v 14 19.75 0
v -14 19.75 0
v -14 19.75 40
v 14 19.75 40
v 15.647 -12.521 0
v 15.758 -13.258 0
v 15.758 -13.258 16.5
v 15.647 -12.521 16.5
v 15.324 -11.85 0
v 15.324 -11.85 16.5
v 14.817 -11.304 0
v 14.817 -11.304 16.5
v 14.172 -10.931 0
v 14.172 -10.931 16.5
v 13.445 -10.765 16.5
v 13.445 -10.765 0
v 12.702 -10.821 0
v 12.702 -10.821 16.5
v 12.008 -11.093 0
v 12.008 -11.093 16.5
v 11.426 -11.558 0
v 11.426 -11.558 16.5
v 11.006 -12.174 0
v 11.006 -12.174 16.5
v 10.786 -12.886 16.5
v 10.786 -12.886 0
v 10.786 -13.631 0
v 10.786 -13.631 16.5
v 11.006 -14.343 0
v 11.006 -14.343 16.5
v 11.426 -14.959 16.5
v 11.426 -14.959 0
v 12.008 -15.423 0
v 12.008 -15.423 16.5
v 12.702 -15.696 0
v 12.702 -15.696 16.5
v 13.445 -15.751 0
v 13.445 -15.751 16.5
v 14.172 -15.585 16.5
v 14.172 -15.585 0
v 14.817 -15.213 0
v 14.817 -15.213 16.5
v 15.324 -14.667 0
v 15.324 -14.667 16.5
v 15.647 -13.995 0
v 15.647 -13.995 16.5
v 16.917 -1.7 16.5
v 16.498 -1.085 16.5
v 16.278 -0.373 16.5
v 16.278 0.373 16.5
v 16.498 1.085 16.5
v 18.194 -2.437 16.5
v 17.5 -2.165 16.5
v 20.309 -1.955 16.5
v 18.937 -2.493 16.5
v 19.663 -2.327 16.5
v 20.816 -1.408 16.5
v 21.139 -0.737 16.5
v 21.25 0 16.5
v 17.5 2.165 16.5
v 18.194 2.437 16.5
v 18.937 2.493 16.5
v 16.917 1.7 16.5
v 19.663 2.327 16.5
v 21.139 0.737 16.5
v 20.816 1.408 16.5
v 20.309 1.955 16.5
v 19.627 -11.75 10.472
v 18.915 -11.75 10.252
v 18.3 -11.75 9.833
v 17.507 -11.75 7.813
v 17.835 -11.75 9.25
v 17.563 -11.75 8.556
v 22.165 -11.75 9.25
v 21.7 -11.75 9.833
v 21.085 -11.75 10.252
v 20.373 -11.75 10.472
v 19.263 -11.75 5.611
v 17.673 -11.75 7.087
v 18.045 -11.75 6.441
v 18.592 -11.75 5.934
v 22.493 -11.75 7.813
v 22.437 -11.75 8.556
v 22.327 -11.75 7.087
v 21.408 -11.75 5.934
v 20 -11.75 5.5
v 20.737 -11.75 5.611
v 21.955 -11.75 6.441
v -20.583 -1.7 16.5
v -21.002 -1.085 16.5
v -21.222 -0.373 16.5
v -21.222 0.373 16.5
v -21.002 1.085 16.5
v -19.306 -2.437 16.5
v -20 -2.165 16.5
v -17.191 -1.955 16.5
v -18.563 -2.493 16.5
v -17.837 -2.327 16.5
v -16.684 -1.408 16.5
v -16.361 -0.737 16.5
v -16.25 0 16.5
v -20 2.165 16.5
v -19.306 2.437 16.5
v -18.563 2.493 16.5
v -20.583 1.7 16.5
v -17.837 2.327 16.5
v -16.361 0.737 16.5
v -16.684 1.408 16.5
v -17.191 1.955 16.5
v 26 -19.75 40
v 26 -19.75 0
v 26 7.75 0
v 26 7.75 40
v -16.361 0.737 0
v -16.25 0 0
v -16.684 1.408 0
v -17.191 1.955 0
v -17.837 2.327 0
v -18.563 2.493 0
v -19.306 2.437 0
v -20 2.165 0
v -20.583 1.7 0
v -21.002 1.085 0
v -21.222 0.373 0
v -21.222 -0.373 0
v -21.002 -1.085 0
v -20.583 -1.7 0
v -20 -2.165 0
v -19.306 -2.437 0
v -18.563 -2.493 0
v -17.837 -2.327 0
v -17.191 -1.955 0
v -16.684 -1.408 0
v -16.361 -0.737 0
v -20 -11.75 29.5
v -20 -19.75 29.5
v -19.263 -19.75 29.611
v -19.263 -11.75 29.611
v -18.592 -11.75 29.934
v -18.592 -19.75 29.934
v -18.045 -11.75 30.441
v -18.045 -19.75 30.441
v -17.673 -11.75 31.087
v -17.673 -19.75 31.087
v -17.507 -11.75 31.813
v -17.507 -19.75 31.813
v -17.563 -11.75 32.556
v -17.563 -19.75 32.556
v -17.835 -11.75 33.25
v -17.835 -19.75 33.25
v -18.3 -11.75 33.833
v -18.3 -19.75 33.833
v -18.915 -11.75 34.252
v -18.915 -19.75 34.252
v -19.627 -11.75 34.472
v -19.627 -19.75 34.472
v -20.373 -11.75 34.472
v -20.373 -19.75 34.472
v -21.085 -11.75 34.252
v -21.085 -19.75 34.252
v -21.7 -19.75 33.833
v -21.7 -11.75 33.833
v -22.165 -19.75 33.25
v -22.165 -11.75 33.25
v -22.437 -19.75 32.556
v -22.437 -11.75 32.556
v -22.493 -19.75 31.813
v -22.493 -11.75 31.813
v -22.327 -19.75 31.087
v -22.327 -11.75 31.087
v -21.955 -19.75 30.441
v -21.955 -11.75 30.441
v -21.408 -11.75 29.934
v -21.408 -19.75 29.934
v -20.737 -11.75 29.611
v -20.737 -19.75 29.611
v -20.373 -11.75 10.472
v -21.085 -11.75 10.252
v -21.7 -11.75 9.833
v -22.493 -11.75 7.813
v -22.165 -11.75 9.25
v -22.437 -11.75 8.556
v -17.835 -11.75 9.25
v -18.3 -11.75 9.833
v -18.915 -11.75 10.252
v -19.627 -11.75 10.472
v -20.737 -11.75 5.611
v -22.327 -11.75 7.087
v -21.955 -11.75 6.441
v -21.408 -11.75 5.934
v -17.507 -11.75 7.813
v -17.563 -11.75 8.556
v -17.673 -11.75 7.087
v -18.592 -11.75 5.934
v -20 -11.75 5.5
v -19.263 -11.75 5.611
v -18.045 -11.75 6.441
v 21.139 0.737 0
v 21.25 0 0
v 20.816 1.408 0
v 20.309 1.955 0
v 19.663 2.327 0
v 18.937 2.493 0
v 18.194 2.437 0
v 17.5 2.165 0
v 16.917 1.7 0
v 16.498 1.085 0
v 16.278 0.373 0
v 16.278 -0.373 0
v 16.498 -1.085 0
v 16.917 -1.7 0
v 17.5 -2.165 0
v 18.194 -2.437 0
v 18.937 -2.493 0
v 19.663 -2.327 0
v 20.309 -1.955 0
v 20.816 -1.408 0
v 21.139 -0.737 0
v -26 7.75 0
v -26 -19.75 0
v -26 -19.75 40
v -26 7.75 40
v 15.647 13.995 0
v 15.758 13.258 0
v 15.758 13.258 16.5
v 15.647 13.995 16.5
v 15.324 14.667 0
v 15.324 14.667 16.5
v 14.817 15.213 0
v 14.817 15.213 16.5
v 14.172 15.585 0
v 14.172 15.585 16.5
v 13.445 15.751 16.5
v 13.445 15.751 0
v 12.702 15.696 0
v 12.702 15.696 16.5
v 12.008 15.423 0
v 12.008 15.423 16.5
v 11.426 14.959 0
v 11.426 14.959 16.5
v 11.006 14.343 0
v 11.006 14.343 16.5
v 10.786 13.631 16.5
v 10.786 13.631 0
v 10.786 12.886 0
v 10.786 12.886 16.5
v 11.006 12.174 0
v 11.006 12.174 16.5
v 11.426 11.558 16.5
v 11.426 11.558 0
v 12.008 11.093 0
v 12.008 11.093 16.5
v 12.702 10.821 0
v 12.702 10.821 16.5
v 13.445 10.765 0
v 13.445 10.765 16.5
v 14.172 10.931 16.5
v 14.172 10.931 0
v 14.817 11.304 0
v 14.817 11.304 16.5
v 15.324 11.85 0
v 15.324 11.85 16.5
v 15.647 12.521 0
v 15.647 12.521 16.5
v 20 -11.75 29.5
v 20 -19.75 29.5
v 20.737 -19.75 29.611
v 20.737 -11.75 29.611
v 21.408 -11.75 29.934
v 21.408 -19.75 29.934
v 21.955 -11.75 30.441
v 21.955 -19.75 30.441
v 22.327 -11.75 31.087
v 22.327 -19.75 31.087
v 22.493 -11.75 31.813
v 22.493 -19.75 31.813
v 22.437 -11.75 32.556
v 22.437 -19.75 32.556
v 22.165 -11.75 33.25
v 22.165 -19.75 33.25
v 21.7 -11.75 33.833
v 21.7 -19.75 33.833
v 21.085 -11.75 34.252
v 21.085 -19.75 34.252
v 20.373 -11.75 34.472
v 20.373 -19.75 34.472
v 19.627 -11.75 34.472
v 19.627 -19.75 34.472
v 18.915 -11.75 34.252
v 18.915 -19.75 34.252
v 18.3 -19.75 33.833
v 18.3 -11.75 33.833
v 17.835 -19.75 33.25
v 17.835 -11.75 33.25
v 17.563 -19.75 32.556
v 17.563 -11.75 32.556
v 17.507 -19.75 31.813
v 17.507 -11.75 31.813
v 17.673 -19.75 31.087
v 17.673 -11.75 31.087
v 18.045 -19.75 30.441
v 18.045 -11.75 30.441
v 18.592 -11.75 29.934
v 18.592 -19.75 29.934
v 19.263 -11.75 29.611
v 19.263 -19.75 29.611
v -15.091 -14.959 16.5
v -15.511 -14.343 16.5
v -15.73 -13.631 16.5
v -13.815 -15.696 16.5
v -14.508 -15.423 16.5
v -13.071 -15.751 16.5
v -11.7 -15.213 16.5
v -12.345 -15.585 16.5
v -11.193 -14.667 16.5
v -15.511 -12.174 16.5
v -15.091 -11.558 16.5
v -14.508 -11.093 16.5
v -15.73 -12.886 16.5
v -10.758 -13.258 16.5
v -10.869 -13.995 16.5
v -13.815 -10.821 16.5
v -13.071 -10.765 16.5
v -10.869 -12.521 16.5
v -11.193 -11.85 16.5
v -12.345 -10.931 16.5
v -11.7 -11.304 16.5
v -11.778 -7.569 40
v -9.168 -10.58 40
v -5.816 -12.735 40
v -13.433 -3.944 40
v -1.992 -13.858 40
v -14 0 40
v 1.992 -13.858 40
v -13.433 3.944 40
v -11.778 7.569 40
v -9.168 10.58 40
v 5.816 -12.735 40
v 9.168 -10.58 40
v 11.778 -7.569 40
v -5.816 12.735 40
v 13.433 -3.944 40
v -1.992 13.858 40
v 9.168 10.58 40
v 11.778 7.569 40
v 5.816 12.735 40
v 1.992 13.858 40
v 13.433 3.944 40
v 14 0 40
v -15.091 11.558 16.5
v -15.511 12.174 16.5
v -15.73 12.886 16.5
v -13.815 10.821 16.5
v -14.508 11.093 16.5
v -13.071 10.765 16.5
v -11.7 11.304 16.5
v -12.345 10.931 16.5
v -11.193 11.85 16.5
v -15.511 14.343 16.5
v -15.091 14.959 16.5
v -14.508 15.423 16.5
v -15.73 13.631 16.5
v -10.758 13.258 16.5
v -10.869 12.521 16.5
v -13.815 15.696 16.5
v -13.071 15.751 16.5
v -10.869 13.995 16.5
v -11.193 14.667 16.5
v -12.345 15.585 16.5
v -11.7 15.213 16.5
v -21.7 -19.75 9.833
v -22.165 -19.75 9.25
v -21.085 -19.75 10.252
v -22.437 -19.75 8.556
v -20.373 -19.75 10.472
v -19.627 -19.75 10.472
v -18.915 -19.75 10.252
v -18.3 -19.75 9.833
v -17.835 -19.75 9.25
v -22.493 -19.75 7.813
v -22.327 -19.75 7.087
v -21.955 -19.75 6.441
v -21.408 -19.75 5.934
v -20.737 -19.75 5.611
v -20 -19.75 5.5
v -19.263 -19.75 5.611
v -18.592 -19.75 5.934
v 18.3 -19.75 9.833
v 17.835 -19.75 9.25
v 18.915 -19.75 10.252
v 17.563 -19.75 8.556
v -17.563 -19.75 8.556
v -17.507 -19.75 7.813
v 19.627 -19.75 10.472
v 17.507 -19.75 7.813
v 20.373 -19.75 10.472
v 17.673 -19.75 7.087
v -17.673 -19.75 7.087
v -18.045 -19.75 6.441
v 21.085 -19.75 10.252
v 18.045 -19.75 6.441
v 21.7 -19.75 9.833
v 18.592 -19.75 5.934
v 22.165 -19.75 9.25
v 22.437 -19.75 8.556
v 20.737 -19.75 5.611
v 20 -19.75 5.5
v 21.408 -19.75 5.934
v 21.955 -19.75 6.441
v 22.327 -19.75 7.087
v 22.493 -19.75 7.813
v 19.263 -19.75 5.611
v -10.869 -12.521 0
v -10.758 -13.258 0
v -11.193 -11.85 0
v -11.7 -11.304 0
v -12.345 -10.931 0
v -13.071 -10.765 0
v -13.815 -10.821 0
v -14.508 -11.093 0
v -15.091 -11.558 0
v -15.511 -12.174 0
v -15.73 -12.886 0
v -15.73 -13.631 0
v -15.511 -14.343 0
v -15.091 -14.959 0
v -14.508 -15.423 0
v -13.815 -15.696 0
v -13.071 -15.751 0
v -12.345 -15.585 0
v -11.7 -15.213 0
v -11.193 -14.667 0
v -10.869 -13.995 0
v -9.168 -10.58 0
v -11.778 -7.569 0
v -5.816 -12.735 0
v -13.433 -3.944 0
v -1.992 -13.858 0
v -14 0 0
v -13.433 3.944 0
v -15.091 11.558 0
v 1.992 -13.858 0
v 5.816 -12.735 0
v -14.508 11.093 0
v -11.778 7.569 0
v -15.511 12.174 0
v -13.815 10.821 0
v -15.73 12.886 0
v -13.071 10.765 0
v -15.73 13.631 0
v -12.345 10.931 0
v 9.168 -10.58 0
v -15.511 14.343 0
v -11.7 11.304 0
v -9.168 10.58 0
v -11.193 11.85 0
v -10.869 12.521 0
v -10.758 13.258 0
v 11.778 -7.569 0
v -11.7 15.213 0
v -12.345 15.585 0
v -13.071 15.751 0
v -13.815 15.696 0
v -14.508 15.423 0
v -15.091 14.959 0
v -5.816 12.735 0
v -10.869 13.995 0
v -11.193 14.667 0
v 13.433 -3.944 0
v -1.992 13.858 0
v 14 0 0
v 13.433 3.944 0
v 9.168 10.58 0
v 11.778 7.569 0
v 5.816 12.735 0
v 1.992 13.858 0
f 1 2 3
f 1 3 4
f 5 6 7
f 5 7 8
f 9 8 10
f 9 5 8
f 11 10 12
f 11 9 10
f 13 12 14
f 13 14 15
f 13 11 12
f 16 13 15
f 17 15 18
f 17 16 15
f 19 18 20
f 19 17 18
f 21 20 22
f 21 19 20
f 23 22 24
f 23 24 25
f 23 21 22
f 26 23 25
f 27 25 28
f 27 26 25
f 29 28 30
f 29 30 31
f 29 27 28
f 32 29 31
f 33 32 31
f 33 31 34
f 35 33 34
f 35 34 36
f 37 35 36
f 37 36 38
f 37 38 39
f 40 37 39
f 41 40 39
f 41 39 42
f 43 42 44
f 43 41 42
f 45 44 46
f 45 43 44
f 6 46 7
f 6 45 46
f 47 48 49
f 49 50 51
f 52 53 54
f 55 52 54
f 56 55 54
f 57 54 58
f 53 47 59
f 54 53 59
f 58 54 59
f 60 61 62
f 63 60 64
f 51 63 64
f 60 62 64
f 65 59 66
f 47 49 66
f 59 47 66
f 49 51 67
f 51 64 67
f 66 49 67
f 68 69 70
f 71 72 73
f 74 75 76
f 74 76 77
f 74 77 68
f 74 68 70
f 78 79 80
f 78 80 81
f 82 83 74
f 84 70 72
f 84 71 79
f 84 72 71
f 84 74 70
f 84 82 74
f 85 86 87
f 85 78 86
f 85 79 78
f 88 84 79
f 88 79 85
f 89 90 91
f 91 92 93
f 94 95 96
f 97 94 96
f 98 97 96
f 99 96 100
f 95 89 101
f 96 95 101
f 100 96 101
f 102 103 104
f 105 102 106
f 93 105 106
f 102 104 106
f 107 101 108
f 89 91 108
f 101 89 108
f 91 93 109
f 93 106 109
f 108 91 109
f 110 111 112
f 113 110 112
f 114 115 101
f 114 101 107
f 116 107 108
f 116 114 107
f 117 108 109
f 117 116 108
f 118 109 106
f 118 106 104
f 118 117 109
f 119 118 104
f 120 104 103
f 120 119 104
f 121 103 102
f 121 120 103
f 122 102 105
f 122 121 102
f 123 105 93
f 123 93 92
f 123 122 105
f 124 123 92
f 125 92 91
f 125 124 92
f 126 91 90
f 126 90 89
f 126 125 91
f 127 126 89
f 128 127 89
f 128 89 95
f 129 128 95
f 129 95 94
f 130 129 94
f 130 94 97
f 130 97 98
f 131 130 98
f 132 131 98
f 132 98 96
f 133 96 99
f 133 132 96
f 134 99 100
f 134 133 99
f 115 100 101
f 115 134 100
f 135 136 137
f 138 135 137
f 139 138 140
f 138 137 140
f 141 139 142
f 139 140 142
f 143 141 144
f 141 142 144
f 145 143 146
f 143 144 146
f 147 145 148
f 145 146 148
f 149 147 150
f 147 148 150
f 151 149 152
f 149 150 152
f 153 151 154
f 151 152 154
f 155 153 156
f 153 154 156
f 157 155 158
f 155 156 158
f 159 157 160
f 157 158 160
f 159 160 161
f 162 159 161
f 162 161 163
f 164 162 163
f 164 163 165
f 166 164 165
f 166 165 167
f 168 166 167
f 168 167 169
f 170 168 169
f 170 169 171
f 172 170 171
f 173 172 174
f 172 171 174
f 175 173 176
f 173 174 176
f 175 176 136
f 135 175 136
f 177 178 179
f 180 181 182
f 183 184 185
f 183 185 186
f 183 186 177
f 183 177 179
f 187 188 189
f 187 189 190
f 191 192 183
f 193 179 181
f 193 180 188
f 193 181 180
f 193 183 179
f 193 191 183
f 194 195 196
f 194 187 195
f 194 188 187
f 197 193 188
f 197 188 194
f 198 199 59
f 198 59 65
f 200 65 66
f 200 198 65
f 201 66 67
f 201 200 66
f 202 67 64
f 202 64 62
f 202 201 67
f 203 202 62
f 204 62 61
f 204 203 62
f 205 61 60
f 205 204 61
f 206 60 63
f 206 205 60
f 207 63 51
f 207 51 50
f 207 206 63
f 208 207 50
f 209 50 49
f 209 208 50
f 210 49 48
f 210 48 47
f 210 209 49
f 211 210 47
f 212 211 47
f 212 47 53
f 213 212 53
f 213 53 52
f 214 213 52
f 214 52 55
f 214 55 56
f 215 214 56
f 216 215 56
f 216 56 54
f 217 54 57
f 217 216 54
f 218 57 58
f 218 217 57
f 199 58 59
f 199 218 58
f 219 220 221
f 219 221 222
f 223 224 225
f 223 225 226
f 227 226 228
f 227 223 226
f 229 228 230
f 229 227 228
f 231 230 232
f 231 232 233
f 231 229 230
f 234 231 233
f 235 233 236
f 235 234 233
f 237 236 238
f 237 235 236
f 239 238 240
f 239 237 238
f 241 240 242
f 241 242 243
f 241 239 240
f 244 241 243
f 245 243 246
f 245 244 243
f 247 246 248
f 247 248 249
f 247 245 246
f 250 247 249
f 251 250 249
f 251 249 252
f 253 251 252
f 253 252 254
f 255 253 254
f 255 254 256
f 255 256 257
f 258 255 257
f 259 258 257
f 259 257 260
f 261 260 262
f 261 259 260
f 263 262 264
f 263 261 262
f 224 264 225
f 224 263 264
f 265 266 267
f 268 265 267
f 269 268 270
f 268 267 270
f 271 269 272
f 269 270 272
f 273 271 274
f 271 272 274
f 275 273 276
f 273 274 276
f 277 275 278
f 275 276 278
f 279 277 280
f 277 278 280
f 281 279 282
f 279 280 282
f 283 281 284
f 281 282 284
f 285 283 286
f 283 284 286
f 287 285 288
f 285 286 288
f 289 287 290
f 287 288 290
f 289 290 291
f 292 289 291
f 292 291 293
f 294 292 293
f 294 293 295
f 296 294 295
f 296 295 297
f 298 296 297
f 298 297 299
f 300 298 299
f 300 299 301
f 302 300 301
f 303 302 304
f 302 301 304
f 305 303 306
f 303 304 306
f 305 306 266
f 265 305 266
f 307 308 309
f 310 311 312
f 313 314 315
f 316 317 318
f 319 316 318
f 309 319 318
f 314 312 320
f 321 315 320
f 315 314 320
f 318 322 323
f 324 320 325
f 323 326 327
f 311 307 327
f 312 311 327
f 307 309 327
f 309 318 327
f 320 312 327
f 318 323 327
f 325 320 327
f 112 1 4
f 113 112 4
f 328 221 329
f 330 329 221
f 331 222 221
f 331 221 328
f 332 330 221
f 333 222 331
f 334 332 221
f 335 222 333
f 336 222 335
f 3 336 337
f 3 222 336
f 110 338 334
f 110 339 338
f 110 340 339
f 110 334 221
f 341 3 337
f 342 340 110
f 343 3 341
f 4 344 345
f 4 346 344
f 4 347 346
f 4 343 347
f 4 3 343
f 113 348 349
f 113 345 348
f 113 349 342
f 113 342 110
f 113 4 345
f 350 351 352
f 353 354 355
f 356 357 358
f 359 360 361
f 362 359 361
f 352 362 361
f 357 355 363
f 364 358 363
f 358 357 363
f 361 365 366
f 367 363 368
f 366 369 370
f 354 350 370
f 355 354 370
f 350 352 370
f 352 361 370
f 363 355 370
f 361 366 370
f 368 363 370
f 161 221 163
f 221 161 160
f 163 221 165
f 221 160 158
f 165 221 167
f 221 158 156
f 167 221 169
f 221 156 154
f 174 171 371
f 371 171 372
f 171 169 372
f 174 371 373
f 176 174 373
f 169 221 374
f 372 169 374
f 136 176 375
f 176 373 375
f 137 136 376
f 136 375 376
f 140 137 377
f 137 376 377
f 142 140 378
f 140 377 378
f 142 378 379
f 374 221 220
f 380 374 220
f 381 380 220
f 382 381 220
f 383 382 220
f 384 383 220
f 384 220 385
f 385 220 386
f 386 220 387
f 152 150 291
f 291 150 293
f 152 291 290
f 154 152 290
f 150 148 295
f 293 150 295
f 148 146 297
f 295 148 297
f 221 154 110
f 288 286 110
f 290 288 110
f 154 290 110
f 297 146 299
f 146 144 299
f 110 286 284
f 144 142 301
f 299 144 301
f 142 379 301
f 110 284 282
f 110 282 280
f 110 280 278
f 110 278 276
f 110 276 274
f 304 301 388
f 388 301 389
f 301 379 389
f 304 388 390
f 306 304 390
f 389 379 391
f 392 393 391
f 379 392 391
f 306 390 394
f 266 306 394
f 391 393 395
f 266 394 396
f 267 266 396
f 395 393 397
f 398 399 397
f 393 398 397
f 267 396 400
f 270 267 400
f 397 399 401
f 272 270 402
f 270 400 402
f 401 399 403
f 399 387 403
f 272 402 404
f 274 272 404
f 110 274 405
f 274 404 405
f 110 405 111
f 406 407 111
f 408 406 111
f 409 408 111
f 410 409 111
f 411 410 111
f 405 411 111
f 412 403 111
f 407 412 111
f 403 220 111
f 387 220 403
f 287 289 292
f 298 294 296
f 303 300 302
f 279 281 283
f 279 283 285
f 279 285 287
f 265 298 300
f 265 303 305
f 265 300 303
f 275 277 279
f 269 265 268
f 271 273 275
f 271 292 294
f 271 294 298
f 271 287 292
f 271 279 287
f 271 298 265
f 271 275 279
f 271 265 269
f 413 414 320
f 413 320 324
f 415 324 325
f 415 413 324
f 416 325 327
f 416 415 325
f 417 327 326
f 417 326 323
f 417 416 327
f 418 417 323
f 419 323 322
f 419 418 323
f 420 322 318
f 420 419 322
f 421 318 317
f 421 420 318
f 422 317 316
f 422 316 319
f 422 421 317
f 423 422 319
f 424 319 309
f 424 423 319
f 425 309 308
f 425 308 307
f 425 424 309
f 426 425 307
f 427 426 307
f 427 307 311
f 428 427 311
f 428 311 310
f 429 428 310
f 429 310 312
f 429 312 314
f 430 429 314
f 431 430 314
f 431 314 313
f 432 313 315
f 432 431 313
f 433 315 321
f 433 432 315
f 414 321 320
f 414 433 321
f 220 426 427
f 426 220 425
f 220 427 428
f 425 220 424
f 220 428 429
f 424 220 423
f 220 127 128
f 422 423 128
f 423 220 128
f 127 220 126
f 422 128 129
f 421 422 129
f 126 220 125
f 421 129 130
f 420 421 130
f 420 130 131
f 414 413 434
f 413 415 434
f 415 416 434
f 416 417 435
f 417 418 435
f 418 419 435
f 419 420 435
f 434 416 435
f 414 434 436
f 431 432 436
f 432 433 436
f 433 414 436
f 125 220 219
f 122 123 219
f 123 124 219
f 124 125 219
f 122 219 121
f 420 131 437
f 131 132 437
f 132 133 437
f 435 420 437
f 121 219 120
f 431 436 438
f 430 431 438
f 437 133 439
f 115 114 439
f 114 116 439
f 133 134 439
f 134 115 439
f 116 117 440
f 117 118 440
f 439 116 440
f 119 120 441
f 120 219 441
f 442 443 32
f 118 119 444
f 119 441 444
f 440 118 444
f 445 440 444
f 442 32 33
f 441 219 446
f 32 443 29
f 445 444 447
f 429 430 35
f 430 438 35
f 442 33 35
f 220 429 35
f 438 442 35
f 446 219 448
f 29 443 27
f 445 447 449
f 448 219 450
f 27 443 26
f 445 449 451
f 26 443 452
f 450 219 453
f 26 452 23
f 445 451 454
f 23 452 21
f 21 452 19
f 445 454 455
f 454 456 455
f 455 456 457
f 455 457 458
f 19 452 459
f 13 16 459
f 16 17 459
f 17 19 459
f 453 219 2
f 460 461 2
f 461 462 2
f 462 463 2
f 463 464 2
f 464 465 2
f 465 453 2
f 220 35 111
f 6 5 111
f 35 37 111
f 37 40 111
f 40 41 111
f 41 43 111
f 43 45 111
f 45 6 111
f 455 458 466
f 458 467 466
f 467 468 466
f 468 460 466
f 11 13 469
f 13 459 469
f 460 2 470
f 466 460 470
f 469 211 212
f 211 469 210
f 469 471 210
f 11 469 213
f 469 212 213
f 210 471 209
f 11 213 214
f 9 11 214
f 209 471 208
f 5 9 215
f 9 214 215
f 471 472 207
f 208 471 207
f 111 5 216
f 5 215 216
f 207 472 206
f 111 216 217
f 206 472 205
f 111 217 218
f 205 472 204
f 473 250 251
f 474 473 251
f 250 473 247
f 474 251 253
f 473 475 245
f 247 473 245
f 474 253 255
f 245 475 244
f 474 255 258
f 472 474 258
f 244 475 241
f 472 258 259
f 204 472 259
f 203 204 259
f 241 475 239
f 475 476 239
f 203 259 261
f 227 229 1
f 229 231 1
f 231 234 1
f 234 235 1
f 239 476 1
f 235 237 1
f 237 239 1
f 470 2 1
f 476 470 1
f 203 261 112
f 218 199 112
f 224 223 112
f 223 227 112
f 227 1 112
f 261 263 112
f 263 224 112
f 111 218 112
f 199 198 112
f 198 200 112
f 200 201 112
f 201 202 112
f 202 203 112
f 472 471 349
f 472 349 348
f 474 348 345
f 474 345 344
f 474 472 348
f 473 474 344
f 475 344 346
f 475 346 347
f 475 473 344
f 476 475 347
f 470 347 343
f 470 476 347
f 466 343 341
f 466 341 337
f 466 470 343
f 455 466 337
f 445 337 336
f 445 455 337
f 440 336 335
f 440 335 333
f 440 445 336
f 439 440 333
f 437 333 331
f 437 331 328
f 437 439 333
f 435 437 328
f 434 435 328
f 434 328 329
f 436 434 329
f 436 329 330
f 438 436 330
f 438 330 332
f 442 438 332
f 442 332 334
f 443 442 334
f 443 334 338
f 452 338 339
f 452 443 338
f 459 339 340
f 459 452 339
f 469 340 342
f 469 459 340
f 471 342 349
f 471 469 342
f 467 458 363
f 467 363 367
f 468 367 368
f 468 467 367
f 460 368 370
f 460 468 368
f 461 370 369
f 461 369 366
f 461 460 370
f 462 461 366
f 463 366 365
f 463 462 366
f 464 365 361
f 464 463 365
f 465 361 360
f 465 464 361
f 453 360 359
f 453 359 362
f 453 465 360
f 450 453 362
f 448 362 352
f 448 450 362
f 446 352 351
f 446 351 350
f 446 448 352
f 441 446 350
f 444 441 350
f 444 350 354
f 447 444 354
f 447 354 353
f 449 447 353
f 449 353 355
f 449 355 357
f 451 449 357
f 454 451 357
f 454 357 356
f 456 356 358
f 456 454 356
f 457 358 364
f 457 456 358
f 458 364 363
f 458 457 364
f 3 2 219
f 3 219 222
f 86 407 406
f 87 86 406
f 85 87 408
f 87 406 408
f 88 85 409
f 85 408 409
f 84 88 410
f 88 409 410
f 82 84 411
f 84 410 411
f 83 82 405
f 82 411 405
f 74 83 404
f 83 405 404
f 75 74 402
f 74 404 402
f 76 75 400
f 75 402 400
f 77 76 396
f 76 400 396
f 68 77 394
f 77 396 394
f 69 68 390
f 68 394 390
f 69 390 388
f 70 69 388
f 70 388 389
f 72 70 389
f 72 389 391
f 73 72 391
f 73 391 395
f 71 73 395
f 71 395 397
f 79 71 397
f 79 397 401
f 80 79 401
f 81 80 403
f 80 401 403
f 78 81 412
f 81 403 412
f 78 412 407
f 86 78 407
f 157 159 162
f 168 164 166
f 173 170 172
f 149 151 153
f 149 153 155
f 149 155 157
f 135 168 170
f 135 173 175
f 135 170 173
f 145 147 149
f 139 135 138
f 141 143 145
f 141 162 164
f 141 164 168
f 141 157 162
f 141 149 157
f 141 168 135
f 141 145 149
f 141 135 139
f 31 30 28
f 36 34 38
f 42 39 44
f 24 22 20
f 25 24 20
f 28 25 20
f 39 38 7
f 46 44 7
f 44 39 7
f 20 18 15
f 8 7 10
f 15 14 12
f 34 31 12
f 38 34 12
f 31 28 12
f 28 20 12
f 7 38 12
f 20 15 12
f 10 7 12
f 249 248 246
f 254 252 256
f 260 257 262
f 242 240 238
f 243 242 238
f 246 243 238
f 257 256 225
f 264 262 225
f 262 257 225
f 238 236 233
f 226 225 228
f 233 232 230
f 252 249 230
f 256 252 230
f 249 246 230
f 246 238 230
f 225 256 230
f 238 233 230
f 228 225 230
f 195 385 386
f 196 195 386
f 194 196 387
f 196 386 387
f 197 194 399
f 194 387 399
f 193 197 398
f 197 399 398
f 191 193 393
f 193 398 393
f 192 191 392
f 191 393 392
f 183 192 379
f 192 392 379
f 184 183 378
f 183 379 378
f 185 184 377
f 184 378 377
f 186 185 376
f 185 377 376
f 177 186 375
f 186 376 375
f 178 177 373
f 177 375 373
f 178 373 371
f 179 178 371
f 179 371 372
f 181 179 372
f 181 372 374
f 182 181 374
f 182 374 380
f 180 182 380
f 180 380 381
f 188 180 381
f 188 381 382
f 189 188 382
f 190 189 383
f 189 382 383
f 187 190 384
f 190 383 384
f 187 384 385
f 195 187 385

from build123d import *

# Parameters (mm, degrees)
SKETCH1_W           = 52
SKETCH1_H           = 39.5
SKETCH1_R           = 2.5
SKETCH1_R_2         = 14
BOSS_EXTRUDE1_DEPTH = 40
CHAMFER1_SIZE       = 12
SKETCH1_3_R         = 2.5
CUT_EXTRUDE1_DEPTH  = 16.5
SKETCH2_R           = 2.5
CUT_EXTRUDE2_DEPTH  = 8


with BuildPart() as part:
    # Sketch1 → Boss-Extrude1 (new body)
    with BuildSketch(Plane.XY):
        Rectangle(SKETCH1_W, SKETCH1_H)
        with Locations((13.258252147, 13.258252147)):
            Circle(SKETCH1_R, mode=Mode.SUBTRACT)
        with Locations((-13.258252147, 13.258252147)):
            Circle(SKETCH1_R, mode=Mode.SUBTRACT)
        with Locations((-18.75, 0)):
            Circle(SKETCH1_R, mode=Mode.SUBTRACT)
        with Locations((-13.258252147, -13.258252147)):
            Circle(SKETCH1_R, mode=Mode.SUBTRACT)
        with Locations((13.258252147, -13.258252147)):
            Circle(SKETCH1_R, mode=Mode.SUBTRACT)
        with Locations((18.75, 0)):
            Circle(SKETCH1_R, mode=Mode.SUBTRACT)
        Circle(SKETCH1_R_2, mode=Mode.SUBTRACT)
        with Locations((13.258252147, -13.258252147)):
            Circle(SKETCH1_R)
        with Locations((-13.258252147, -13.258252147)):
            Circle(SKETCH1_R)
        with Locations((-18.75, 0)):
            Circle(SKETCH1_R)
        with Locations((18.75, 0)):
            Circle(SKETCH1_R)
        with Locations((-13.258252147, 13.258252147)):
            Circle(SKETCH1_R)
        with Locations((13.258252147, 13.258252147)):
            Circle(SKETCH1_R)
    extrude(amount=BOSS_EXTRUDE1_DEPTH)

    # Chamfer1
    chamfer1_edges = [part.edges().sort_by_distance(p)[0] for p in [
        (-26, 19.75, 20),
        (26, 19.75, 20),
    ]]
    chamfer(chamfer1_edges, length=CHAMFER1_SIZE)

    # Sketch1<3> → Cut-Extrude1 (cut)
    with BuildSketch(Plane.XY):
        with Locations((13.258252147, 13.258252147)):
            Circle(SKETCH1_3_R)
        with Locations((18.75, 0)):
            Circle(SKETCH1_3_R)
        with Locations((13.258252147, -13.258252147)):
            Circle(SKETCH1_3_R)
        with Locations((-13.258252147, -13.258252147)):
            Circle(SKETCH1_3_R)
        with Locations((-18.75, 0)):
            Circle(SKETCH1_3_R)
        with Locations((-13.258252147, 13.258252147)):
            Circle(SKETCH1_3_R)
    extrude(amount=CUT_EXTRUDE1_DEPTH, mode=Mode.SUBTRACT)

    # Sketch2 → Cut-Extrude2 (cut)
    with BuildSketch(Plane.XZ.offset(19.75)):
        with Locations(Location((20, 8, 0), (0, 0, 270))):
            Circle(SKETCH2_R)
        with Locations(Location((-20, 8, 0), (0, 0, 270))):
            Circle(SKETCH2_R)
        with Locations(Location((20, 32, 0), (0, 0, 270))):
            Circle(SKETCH2_R)
        with Locations(Location((-20, 32, 0), (0, 0, 270))):
            Circle(SKETCH2_R)
    extrude(amount=-CUT_EXTRUDE2_DEPTH, mode=Mode.SUBTRACT)


solid = part.part
